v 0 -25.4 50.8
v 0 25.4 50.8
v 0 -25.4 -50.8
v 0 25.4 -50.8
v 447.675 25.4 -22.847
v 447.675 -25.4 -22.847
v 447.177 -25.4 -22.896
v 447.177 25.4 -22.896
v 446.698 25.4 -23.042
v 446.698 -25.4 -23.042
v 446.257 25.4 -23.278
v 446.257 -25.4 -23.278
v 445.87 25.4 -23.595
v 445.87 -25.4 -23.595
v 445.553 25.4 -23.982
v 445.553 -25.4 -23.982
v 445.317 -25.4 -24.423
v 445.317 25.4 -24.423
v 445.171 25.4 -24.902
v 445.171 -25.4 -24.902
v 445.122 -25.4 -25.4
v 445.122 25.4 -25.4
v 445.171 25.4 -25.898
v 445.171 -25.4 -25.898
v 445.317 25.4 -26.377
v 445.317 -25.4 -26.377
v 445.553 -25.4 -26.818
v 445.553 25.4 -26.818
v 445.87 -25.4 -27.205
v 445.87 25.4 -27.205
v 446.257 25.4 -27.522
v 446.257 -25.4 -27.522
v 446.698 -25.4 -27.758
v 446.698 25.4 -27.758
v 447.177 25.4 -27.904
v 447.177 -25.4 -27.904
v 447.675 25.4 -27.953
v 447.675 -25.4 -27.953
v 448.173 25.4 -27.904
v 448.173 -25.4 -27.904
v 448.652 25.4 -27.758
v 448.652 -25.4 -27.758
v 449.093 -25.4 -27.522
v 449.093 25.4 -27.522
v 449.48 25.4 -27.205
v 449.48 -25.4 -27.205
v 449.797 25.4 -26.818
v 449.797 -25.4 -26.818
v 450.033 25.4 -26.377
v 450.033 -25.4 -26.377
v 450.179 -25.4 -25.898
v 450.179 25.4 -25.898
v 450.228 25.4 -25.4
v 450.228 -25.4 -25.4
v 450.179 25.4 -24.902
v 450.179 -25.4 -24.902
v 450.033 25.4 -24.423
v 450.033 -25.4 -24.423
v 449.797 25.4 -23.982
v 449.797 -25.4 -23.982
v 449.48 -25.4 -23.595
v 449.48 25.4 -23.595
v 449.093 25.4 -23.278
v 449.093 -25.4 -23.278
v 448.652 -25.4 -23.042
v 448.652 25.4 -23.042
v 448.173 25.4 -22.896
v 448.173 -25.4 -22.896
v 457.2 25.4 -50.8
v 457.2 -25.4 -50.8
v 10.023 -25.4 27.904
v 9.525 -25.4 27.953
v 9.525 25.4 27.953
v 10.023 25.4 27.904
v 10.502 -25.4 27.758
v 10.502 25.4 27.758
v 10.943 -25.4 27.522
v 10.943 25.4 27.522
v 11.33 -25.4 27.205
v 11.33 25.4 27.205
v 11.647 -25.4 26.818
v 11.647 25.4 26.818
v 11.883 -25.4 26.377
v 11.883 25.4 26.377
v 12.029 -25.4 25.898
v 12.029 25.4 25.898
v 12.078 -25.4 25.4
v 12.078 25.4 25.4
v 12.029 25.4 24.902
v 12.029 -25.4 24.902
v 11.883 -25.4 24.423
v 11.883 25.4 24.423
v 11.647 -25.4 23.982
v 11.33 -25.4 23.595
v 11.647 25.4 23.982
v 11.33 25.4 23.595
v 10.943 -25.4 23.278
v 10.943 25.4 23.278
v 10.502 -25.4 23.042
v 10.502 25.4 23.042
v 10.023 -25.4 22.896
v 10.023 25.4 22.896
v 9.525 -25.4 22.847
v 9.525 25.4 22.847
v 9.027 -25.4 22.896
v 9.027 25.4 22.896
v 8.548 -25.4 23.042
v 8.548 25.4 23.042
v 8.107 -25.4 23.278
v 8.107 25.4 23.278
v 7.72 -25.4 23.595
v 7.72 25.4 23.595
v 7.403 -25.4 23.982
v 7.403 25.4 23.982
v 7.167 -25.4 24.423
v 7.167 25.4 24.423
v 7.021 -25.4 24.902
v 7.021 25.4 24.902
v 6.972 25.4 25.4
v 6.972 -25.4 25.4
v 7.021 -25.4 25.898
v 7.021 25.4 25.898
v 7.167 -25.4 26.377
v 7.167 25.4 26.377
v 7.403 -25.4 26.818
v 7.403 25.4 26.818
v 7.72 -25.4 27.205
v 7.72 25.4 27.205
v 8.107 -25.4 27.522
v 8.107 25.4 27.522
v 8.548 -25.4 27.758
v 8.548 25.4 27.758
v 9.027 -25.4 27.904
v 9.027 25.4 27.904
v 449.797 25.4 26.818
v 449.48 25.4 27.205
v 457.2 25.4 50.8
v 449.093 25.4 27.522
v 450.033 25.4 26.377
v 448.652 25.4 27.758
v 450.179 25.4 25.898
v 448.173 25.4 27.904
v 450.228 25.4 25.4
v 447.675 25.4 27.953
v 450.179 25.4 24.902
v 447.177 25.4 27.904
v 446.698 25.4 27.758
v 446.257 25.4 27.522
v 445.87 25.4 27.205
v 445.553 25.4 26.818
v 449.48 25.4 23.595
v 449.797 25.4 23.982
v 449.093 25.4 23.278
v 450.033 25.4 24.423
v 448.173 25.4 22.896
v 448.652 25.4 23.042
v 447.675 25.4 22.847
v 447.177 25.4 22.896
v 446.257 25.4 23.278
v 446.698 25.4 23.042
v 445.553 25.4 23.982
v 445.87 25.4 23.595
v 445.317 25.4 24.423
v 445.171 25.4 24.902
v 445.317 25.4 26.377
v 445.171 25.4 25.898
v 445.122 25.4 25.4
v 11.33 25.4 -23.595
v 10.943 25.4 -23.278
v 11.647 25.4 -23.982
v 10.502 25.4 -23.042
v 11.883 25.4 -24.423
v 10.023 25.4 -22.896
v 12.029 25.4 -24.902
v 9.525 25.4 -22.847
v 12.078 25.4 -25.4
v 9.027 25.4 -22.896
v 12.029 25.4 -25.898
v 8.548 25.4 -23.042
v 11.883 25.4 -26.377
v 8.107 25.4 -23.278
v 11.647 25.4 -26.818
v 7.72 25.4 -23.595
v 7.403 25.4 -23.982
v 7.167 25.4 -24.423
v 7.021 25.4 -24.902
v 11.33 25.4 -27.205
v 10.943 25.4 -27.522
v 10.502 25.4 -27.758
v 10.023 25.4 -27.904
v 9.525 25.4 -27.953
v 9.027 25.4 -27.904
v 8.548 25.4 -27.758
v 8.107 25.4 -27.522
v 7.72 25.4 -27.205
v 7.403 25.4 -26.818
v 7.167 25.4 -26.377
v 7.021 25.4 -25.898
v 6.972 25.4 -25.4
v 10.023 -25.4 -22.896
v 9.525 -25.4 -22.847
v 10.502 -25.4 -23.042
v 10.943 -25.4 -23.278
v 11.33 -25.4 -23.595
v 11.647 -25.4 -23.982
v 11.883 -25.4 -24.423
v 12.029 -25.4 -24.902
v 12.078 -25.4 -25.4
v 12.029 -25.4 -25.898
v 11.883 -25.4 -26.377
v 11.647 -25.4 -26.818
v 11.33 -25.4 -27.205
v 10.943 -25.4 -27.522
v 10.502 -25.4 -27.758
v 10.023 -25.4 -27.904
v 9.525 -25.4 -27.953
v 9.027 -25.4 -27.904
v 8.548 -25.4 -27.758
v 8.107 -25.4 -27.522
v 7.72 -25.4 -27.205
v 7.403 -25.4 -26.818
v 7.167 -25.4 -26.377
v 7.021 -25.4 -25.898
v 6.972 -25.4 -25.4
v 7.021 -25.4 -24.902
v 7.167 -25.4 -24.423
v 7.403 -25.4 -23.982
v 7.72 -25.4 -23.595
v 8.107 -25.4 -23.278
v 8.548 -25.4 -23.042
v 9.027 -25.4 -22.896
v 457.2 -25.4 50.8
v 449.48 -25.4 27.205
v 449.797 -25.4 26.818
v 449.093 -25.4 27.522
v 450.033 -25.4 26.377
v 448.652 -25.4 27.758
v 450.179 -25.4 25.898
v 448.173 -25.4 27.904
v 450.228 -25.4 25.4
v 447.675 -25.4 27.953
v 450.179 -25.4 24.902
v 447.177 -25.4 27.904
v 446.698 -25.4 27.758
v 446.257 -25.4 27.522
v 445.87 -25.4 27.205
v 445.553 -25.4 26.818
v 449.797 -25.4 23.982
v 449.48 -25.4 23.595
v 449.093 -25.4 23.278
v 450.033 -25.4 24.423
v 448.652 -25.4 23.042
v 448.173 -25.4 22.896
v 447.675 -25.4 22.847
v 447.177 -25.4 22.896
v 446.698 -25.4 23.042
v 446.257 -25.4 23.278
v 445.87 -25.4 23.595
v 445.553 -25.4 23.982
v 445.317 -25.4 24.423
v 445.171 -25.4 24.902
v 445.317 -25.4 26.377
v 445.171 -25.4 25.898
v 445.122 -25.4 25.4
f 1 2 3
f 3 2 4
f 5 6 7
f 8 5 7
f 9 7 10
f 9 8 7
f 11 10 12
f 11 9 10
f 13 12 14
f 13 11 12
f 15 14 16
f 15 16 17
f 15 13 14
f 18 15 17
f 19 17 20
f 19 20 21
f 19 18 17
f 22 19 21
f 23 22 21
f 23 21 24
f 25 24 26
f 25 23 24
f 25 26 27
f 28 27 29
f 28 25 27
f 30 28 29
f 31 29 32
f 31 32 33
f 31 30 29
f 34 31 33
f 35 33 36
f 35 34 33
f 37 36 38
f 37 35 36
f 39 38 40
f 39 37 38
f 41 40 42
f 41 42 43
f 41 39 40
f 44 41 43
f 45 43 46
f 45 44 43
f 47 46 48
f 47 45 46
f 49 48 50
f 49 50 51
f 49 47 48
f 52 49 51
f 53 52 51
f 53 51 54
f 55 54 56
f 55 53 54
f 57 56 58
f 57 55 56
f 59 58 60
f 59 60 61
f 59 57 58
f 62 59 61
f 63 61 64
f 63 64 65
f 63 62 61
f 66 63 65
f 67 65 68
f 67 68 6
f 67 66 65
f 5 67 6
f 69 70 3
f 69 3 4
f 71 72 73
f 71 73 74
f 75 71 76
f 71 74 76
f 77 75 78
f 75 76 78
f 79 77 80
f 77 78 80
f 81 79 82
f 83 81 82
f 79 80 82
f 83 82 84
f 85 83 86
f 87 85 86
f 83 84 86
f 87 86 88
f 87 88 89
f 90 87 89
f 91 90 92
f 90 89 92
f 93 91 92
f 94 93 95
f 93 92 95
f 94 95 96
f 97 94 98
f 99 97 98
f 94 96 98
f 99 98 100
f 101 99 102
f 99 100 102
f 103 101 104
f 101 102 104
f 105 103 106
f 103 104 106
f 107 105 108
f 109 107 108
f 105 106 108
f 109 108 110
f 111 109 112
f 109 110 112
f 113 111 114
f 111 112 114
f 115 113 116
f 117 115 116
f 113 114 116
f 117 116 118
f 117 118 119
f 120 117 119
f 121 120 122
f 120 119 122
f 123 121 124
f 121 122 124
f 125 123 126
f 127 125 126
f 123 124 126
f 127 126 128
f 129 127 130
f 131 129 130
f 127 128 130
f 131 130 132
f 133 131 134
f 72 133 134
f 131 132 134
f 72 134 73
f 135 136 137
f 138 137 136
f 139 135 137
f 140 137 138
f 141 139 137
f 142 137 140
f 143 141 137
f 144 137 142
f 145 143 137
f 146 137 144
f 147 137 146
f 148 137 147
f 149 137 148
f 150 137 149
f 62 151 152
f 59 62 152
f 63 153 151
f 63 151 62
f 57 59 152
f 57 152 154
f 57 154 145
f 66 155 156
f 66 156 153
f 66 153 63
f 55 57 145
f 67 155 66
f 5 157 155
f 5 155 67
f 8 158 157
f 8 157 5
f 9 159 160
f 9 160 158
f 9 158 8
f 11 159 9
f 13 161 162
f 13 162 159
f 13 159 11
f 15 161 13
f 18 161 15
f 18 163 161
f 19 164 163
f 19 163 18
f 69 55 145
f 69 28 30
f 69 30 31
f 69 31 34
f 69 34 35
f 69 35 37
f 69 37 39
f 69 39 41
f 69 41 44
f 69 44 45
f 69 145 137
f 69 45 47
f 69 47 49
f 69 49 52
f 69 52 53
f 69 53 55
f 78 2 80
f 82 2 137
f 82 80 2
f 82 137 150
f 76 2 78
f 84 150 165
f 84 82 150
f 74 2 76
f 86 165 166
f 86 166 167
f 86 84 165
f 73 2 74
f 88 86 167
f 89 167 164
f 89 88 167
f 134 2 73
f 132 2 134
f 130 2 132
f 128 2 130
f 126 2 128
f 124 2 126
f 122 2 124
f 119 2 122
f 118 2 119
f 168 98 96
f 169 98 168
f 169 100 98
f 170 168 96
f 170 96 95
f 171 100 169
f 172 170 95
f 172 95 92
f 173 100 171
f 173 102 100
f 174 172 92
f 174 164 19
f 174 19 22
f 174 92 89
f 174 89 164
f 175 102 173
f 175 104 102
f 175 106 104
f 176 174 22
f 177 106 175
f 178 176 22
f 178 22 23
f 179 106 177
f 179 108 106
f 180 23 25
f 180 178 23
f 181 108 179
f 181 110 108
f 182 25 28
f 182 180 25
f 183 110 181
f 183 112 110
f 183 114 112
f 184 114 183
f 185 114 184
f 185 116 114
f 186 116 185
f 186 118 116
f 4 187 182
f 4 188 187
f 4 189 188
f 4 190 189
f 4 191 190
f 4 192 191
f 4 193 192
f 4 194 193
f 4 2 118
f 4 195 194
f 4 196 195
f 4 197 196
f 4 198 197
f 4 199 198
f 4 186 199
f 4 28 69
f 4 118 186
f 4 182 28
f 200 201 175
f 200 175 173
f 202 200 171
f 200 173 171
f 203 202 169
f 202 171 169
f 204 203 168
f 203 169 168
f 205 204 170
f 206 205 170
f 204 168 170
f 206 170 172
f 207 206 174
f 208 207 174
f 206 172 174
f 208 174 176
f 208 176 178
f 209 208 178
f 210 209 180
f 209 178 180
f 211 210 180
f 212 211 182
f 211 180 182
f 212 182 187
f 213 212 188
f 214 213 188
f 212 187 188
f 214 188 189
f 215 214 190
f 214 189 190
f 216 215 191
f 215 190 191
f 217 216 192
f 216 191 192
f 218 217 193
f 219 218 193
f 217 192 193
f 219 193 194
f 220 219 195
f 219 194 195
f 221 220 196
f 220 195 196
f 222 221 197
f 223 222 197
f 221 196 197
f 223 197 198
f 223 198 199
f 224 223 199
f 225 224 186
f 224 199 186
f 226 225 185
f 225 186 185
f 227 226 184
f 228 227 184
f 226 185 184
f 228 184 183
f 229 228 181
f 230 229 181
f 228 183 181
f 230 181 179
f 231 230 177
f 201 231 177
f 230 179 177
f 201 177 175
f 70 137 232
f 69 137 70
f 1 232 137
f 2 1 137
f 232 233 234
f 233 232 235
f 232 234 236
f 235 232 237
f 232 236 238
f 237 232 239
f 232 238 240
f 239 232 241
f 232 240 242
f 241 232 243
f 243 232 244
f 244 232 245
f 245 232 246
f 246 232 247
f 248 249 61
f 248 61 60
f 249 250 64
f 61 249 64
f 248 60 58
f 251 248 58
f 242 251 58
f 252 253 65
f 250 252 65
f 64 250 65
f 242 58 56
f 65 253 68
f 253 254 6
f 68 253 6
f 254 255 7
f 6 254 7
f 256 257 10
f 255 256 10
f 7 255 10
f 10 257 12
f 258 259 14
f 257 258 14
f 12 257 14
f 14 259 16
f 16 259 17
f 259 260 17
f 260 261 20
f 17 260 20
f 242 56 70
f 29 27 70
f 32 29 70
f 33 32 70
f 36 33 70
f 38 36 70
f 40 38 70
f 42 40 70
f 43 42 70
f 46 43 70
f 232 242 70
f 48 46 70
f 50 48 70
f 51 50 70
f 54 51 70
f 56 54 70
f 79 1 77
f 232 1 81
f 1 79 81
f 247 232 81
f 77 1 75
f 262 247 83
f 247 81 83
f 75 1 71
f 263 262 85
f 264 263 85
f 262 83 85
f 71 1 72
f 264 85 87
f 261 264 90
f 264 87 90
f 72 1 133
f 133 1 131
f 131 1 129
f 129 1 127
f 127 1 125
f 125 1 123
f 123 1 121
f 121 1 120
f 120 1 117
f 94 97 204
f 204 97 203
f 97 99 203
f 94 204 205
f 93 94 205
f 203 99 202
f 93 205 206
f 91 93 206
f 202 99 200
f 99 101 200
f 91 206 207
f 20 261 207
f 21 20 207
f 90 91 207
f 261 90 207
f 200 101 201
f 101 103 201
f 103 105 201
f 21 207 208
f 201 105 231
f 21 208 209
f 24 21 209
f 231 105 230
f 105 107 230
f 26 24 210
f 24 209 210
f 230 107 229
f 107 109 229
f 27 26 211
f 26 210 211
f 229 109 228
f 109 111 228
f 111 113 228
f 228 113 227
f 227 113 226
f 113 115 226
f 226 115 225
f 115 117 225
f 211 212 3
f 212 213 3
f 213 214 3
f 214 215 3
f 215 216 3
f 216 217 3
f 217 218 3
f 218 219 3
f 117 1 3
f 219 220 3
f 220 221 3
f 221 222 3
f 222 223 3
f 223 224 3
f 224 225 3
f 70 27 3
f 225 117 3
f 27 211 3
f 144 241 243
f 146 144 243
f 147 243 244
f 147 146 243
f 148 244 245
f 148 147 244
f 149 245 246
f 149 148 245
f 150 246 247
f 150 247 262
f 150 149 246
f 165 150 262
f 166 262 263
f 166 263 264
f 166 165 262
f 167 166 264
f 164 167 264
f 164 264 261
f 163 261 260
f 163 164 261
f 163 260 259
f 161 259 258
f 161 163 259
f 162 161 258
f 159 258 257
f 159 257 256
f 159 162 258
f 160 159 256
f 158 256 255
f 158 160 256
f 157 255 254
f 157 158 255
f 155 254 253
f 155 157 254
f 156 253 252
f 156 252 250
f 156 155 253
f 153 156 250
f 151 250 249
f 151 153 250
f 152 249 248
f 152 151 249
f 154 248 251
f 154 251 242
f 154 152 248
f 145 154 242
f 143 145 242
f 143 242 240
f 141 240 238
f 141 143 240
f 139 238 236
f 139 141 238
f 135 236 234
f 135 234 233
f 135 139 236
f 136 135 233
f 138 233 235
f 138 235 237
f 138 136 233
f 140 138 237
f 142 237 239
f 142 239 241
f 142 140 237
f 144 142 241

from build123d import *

# Parameters (mm, degrees)
SKETCH1_W           = 101.6
SKETCH1_H           = 50.8
BOSS_EXTRUDE1_DEPTH = 457.2
SKETCH3_R           = 2.5527
CUT_EXTRUDE1_DEPTH  = 50.8


with BuildPart() as part:
    # Sketch1 → Boss-Extrude1 (new body)
    with BuildSketch(Plane(origin=(0, 0, 0), x_dir=(0, 0, -1), z_dir=(1, 0, 0))):
        Rectangle(SKETCH1_W, SKETCH1_H)
    extrude(amount=BOSS_EXTRUDE1_DEPTH)

    # Sketch3 → Cut-Extrude1 (cut)
    with BuildSketch(Plane(origin=(0, 25.4, 0), x_dir=(1, 0, 0), z_dir=(0, 1, 0))):
        with Locations(Location((9.525, 25.4, 0), (0, 0, 270))):
            Circle(SKETCH3_R)
        with Locations(Location((9.525, -25.4, 0), (0, 0, 270))):
            Circle(SKETCH3_R)
    cut_extrude1 = extrude(amount=-CUT_EXTRUDE1_DEPTH, mode=Mode.SUBTRACT)

    # Mirror1: Cut-Extrude1 across plane
    add(cut_extrude1.mirror(Plane.ZY.offset(-228.6)), mode=Mode.SUBTRACT)


solid = part.part
